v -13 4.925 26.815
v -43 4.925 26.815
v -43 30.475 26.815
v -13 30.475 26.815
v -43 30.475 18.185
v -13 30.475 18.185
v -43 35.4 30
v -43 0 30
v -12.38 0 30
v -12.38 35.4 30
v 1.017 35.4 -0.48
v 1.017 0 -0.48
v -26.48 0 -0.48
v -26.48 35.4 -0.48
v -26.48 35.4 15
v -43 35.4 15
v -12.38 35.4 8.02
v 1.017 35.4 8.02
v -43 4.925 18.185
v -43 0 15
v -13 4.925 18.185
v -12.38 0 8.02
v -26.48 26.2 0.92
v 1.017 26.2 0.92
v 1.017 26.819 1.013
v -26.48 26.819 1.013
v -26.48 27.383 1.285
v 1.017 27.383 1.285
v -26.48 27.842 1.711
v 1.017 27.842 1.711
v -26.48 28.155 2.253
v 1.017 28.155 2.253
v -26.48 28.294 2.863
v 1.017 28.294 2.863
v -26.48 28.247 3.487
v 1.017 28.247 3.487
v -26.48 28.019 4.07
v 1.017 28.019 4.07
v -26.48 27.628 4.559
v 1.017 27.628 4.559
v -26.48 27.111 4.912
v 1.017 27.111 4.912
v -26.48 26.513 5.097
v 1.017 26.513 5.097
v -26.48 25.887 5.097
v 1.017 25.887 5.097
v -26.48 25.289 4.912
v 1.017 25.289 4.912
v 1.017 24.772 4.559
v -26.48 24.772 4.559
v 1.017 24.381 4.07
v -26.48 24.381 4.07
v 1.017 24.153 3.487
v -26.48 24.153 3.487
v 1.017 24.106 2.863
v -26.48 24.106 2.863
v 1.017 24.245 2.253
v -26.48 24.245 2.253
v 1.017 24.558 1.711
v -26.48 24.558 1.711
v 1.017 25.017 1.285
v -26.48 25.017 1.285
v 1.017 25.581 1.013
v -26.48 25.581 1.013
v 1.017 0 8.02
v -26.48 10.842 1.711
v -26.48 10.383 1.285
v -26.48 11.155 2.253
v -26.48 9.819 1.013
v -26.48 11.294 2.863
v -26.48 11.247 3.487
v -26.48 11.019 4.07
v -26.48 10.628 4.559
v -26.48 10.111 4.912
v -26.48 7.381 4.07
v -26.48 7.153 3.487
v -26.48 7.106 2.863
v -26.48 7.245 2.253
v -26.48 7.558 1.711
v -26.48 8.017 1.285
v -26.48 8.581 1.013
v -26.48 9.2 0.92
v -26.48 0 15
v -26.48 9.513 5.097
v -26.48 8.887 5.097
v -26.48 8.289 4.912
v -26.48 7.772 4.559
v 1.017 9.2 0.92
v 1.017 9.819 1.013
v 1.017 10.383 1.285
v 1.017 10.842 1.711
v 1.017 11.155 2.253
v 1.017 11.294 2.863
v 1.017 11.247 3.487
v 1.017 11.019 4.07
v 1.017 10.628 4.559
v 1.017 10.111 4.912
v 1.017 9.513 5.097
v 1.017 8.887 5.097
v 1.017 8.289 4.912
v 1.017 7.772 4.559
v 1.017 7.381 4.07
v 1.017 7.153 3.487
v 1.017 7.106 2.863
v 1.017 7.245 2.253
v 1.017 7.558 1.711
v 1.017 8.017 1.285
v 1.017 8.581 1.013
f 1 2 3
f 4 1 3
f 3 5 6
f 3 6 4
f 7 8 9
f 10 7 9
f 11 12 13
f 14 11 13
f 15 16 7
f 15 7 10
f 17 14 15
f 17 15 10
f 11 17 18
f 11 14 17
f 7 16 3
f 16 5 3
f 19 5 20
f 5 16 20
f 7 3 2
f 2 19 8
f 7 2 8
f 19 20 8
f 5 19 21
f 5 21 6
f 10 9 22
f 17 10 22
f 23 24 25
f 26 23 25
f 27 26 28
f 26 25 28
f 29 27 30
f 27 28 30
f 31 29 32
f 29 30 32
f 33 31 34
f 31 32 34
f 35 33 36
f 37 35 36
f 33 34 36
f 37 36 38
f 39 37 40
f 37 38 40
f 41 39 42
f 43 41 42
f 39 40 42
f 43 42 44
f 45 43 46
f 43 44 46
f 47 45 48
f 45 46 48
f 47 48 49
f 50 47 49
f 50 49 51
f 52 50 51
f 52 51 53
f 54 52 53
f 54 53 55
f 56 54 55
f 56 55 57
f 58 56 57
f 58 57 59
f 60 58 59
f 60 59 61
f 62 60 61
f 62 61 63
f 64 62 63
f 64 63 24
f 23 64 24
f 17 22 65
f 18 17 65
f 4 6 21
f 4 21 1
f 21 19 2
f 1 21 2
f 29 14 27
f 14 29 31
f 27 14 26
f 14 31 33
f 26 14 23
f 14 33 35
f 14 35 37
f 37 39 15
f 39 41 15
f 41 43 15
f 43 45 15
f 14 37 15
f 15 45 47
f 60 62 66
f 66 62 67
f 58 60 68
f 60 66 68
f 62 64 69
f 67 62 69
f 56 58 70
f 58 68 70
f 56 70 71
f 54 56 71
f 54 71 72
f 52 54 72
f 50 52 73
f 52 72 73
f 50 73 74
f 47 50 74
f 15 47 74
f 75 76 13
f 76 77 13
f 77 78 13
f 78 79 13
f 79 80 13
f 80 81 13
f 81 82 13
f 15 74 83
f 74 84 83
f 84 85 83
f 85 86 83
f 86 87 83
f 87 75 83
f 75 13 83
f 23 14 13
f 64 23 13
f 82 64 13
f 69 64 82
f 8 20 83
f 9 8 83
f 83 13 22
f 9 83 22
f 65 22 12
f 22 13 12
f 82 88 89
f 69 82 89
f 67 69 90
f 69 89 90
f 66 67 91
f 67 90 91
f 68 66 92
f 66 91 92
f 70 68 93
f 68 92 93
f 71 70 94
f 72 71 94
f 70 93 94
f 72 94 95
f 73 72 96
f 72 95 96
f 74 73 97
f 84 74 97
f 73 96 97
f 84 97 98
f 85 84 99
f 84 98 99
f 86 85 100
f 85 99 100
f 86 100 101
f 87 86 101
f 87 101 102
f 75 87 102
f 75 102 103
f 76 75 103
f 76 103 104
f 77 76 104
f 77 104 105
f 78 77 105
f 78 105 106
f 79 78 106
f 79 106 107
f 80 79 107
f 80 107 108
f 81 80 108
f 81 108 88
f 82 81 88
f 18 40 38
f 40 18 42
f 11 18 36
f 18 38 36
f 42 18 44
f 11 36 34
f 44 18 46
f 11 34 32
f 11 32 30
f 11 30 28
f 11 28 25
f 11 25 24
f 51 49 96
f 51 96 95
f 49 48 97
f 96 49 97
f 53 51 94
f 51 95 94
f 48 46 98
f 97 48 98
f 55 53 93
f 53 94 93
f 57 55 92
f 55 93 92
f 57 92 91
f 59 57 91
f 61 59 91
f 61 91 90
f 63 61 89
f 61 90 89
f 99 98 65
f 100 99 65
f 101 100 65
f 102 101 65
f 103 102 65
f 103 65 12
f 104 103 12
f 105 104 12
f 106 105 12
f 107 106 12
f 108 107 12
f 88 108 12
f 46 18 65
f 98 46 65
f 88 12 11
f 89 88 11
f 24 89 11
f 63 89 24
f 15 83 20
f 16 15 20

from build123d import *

# Parameters (mm, degrees)
BOSS_EXTRUDE1_DEPTH = 35.4
SKETCH2_W           = 8.63
SKETCH2_H           = 25.55
CUT_EXTRUDE1_DEPTH  = 30
SKETCH3_R           = 2.1
CUT_EXTRUDE2_DEPTH  = 64.958508207


with BuildPart() as part:
    # Sketch1 → Boss-Extrude1 (new body)
    with BuildSketch(Plane(origin=(0, 0, 0), x_dir=(1, 0, 0), z_dir=(0, 1, 0))):
        Polygon((1.0173917, 0.48), (-26.48, 0.48), (-26.48, -15), (-31.48, -15), (-43, -15), (-43, -30), (-12.38, -30), (-12.38, -8.02), (-11.48, -8.02), (1.0173917, -8.02), align=None)
    extrude(amount=BOSS_EXTRUDE1_DEPTH)

    # Sketch2 → Cut-Extrude1 (cut)
    with BuildSketch(Plane.ZY.offset(43)):
        with Locations((22.5, 17.7)):
            Rectangle(SKETCH2_W, SKETCH2_H)
    extrude(amount=-CUT_EXTRUDE1_DEPTH, mode=Mode.SUBTRACT)

    # Sketch3 → Cut-Extrude2 (cut, through all)
    with BuildSketch(Plane(origin=(1.0173917, 0, 0), x_dir=(0, 0, -1), z_dir=(1, 0, 0))):
        with Locations((-3.02, 9.2)):
            Circle(SKETCH3_R)
        with Locations((-3.02, 26.2)):
            Circle(SKETCH3_R)
    extrude(amount=-CUT_EXTRUDE2_DEPTH, mode=Mode.SUBTRACT)


solid = part.part
